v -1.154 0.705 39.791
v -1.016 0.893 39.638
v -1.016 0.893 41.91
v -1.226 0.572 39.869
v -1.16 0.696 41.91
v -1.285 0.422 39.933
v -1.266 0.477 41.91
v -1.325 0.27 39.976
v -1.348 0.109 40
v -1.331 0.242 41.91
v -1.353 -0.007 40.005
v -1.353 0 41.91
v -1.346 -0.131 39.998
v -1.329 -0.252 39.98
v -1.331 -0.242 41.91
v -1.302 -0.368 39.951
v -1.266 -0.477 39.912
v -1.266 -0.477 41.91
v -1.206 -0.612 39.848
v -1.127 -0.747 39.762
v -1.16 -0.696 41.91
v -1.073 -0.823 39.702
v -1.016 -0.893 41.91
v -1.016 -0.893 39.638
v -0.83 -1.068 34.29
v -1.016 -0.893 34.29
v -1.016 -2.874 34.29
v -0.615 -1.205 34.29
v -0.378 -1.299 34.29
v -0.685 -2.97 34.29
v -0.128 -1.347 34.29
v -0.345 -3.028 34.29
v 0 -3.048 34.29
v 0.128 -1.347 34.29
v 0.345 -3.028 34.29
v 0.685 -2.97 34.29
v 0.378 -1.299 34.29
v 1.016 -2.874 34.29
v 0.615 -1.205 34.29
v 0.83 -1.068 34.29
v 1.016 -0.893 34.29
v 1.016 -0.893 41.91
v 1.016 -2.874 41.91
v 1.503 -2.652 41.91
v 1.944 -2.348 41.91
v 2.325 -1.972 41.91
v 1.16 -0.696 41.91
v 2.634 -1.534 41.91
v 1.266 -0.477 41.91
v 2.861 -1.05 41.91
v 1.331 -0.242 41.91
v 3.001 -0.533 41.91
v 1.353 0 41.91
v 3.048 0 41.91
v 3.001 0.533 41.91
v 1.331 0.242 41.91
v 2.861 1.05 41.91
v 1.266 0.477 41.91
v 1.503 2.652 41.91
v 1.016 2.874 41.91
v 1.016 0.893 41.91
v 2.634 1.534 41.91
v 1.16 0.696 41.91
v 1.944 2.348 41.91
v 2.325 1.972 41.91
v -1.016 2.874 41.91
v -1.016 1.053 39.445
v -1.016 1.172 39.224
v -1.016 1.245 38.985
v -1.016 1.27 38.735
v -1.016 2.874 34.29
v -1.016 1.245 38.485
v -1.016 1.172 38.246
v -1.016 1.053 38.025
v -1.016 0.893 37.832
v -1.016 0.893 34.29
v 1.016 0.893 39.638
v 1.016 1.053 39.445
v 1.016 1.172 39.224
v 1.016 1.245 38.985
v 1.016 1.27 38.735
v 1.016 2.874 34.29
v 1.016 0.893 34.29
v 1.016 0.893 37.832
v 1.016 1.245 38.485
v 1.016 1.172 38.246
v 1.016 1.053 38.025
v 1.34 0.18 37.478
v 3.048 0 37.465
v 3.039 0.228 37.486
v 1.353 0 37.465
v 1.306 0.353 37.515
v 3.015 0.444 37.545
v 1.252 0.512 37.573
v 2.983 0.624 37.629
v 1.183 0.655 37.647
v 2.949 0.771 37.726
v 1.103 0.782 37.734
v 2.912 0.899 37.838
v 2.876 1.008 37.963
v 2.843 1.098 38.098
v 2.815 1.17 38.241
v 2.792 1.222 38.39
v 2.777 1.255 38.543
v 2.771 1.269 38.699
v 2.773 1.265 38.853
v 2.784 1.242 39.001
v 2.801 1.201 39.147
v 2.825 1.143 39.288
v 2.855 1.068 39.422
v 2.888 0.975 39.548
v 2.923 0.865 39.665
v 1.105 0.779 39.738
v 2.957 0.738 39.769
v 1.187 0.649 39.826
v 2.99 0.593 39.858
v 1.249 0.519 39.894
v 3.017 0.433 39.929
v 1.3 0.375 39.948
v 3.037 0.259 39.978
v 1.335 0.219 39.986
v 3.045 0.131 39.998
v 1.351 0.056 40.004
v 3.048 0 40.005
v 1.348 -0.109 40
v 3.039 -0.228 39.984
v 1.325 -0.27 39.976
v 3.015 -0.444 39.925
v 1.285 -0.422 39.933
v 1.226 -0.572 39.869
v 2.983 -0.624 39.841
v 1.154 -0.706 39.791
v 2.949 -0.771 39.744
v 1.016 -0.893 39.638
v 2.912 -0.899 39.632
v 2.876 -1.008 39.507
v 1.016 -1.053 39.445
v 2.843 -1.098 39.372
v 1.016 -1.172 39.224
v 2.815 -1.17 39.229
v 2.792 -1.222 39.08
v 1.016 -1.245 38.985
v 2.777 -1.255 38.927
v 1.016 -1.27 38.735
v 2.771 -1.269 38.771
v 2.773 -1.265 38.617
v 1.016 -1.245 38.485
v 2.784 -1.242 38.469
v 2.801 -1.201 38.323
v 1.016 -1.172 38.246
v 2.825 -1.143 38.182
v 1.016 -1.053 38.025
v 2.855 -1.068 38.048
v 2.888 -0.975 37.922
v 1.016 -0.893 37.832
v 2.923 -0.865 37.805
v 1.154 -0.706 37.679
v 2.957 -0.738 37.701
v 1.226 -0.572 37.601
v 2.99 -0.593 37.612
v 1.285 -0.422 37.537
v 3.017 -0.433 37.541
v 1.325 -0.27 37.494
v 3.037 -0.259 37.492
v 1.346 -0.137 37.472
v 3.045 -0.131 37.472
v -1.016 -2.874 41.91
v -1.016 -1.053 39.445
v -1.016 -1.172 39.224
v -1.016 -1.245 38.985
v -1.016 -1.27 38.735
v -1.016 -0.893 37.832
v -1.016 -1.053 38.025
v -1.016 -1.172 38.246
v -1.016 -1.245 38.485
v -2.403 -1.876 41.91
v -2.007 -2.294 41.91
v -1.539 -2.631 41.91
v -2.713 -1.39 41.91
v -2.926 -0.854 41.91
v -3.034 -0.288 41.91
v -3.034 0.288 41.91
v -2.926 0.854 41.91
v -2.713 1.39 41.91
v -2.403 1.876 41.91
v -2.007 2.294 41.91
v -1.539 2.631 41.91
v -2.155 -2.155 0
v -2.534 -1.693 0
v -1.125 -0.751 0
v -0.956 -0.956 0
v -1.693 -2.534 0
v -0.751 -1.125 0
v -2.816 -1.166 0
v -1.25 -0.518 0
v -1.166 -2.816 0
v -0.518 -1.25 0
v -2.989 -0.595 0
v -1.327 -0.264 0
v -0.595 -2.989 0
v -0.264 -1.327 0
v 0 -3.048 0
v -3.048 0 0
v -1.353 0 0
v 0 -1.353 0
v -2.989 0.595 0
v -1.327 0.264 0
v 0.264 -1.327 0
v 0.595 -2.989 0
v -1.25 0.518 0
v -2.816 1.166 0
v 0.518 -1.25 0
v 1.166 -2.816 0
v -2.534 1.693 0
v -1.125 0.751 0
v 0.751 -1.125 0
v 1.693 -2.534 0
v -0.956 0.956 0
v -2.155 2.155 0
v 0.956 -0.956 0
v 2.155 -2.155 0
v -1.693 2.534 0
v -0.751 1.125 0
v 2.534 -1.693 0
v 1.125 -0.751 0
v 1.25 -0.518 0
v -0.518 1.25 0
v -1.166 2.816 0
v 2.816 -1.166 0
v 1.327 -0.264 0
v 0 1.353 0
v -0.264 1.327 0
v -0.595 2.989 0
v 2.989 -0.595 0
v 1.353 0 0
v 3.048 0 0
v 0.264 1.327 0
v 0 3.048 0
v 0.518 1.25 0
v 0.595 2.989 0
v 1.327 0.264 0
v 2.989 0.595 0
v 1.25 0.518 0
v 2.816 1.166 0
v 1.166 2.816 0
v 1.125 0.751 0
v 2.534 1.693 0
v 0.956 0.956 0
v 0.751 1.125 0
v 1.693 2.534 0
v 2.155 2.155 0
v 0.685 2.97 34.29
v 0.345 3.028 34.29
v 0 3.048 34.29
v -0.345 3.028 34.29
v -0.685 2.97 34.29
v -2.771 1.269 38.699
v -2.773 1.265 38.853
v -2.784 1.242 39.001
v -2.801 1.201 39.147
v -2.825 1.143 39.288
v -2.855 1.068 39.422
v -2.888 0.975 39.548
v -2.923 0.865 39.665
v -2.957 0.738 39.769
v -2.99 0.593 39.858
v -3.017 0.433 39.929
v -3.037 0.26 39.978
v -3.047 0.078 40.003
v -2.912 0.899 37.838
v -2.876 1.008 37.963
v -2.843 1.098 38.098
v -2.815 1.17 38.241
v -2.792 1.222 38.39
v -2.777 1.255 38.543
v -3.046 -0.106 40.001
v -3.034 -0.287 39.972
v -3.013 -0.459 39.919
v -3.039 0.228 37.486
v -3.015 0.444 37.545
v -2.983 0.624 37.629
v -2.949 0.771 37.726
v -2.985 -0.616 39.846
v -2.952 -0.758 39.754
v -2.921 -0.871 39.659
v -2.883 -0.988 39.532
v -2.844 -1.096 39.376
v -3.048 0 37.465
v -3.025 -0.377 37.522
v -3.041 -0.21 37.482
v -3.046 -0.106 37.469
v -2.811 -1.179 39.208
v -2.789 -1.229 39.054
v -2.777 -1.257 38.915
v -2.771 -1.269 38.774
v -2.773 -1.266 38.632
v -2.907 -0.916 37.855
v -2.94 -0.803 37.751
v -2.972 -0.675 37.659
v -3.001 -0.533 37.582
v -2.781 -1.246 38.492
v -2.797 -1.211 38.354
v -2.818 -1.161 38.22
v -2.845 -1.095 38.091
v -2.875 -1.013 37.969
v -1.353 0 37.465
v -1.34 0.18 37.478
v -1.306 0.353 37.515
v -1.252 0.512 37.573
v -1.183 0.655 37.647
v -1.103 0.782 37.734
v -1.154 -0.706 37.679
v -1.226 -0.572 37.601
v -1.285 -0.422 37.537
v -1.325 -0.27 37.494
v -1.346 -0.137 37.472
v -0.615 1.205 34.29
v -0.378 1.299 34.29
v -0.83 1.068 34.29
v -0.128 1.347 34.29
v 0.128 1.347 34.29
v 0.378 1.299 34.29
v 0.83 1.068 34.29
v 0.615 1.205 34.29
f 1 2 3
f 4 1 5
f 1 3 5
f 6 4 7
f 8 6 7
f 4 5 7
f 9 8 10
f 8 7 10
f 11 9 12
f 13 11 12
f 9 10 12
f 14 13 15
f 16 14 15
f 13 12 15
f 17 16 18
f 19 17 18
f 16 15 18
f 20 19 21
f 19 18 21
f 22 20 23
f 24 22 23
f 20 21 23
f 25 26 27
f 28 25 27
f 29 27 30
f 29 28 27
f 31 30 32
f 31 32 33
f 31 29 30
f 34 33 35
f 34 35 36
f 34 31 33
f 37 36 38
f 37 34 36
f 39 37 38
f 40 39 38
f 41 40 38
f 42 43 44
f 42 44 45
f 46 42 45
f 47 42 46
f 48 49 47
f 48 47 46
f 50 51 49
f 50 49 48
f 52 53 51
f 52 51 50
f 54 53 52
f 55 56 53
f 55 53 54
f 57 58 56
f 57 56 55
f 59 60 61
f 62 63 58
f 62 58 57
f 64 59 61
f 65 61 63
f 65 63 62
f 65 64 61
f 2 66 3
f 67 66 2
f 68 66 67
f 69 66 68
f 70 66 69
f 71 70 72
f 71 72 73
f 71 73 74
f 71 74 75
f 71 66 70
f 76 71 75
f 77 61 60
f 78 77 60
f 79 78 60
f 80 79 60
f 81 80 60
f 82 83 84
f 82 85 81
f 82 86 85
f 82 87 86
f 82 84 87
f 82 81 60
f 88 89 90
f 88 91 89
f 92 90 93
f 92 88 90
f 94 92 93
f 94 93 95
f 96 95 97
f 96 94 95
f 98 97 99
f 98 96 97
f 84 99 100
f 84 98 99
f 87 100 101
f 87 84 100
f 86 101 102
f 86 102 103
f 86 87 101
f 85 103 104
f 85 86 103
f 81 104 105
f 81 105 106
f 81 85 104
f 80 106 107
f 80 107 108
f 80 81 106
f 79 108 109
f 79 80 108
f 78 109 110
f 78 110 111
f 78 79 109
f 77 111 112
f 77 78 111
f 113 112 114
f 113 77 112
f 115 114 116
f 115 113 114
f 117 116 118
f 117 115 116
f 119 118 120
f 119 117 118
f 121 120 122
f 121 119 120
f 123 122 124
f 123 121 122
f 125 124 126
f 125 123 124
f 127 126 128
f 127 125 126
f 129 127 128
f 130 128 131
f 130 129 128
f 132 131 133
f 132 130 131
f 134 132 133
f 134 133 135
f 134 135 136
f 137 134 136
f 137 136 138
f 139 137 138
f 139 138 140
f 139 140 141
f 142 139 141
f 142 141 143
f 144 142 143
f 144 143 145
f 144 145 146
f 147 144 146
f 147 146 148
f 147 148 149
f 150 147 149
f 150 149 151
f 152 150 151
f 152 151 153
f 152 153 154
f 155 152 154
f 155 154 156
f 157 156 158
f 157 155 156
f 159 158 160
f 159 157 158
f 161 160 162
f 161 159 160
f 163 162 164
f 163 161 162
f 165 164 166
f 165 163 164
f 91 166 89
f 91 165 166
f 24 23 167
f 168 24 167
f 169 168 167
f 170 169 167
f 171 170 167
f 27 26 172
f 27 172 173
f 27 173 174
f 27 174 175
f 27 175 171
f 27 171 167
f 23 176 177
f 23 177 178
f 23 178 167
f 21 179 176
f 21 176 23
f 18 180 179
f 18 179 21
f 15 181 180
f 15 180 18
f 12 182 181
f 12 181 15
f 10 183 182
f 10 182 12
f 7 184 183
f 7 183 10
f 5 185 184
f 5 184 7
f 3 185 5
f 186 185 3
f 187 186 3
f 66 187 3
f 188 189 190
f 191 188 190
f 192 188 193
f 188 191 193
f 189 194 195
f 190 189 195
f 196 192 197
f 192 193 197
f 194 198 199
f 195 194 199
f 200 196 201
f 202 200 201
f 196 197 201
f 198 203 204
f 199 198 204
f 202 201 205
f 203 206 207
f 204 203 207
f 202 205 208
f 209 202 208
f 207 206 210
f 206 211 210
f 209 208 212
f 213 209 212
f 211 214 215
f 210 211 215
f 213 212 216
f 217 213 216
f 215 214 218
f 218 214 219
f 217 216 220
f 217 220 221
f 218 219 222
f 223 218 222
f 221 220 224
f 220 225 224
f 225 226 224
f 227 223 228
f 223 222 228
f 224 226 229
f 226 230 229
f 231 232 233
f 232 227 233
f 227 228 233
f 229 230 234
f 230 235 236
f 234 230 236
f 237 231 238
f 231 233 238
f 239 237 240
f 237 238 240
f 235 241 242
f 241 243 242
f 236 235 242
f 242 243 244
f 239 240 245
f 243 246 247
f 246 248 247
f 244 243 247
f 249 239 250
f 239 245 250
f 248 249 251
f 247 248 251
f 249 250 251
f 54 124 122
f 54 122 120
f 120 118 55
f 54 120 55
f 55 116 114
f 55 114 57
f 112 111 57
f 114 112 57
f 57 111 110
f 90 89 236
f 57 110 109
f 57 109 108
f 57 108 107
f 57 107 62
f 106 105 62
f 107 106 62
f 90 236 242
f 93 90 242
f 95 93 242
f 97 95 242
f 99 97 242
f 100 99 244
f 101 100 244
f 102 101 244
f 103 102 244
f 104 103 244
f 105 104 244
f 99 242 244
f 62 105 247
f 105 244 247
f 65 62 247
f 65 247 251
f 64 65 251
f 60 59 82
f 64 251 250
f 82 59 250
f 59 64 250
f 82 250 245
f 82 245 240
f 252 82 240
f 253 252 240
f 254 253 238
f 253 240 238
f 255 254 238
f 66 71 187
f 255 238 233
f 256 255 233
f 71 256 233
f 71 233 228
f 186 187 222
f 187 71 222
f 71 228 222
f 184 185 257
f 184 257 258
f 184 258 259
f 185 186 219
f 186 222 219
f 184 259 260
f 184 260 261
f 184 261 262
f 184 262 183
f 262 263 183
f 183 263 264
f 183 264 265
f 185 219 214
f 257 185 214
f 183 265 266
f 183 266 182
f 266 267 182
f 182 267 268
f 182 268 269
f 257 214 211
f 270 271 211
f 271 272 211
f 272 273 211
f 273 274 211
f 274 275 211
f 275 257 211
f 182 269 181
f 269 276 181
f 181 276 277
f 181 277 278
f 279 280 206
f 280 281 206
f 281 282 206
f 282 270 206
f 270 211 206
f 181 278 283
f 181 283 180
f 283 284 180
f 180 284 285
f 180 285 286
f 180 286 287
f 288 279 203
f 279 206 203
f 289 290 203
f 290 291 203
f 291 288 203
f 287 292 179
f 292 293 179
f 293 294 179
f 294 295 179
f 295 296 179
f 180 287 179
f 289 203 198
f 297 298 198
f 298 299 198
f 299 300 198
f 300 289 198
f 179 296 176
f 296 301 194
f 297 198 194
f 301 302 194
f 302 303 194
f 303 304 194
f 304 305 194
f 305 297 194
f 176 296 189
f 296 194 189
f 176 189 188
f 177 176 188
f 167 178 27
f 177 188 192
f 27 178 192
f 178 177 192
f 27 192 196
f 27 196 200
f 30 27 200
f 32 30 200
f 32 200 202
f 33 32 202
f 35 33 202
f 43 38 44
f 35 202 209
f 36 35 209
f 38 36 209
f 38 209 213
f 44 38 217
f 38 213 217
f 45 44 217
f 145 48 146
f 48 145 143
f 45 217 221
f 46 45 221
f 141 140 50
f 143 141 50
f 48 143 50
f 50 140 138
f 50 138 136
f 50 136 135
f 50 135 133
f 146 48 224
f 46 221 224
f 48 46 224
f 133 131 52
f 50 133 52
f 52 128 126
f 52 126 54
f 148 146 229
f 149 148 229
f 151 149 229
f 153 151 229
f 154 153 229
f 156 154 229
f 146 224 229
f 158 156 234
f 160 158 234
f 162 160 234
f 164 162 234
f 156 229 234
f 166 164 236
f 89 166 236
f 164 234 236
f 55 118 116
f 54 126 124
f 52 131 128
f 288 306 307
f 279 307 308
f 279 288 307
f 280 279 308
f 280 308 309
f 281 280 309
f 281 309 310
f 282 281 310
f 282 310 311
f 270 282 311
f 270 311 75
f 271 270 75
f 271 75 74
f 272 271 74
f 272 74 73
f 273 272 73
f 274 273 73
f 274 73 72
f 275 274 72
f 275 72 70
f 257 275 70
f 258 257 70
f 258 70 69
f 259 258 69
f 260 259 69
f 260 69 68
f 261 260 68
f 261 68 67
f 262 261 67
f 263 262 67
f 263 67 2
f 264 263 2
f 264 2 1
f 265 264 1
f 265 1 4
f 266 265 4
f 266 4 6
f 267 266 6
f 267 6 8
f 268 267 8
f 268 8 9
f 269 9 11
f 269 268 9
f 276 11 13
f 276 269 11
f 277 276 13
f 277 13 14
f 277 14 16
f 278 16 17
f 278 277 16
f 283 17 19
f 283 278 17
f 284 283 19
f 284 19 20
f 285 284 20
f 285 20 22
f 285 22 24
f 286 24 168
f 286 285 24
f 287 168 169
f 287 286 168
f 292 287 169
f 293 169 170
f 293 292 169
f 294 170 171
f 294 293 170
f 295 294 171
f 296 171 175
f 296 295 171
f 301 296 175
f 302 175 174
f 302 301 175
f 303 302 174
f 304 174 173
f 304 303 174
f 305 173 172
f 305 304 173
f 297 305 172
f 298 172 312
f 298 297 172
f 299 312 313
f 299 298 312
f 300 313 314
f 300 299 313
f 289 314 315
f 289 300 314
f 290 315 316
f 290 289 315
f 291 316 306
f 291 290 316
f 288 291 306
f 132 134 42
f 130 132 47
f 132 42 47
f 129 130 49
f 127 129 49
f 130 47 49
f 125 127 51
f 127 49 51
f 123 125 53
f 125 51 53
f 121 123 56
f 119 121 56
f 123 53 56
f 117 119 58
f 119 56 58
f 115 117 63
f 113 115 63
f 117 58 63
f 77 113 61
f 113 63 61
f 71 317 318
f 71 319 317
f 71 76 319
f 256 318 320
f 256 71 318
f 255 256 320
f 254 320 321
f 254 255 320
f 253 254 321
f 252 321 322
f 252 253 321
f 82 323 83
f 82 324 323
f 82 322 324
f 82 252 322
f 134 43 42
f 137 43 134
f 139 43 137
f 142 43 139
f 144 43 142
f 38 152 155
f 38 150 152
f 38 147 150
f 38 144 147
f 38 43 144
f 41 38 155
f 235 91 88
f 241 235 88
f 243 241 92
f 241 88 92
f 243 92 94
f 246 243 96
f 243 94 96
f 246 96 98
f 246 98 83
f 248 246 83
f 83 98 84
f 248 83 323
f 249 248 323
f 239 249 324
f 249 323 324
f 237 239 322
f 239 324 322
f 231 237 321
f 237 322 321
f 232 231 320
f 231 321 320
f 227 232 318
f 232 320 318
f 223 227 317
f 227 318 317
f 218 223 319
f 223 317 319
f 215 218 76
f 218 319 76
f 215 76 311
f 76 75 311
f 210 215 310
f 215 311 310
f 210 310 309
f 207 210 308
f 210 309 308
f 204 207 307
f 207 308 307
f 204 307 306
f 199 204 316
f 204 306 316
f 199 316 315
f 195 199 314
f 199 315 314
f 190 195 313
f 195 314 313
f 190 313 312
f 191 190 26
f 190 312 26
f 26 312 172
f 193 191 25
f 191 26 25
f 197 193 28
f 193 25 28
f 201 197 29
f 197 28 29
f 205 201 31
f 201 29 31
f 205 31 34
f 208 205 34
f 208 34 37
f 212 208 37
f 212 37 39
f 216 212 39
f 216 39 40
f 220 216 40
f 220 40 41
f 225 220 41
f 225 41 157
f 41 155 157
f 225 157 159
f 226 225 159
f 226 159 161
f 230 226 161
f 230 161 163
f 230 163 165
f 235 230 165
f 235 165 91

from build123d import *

# Parameters (mm, degrees)
SKETCH1_R               = 3.048
BOSS_EXTRUDE1_DEPTH     = 41.91
CUT_EXTRUDE1_START      = -7.62
CUT_EXTRUDE1_DEPTH      = 7.62
CUT_EXTRUDE2_DEPTH      = 43.216756152
CUT_EXTRUDE2_DEPTH_BACK = 43.216756152
SKETCH3_R               = 1.27
F_6_32_TAPPED_HOLE1_D   = 2.7051


with BuildPart() as part:
    # Sketch1 → Boss-Extrude1 (new body)
    with BuildSketch(Plane.XY):
        Circle(SKETCH1_R)
    extrude(amount=BOSS_EXTRUDE1_DEPTH)

    # Sketch2 → Cut-Extrude1 (cut)
    with BuildSketch(Plane.XY.offset(41.91).offset(CUT_EXTRUDE1_START)):
        with BuildLine():
            ThreePointArc((1.016, 2.873681959), (0.515422831, 3.00410441), (0, 3.048))
            ThreePointArc((0, 3.048), (-0.515422831, 3.00410441), (-1.016, 2.873681959))
            Line((-1.016, 2.873681959), (-1.016, -2.873681959))
            ThreePointArc((-1.016, -2.873681959), (-0.515422831, -3.00410441), (0, -3.048))
            ThreePointArc((0, -3.048), (0.515422831, -3.00410441), (1.016, -2.873681959))
            Line((1.016, -2.873681959), (1.016, 2.873681959))
        make_face()
    extrude(amount=CUT_EXTRUDE1_DEPTH, mode=Mode.SUBTRACT)

    # Sketch3 → Cut-Extrude2 (cut, two sides: drawn at the far end of the back side and taken through both)
    with BuildSketch(Plane(origin=(-1.016, 0, 0), x_dir=(0, 0, -1), z_dir=(1, 0, 0)).offset(-CUT_EXTRUDE2_DEPTH_BACK)):
        with Locations((-38.735, 0)):
            Circle(SKETCH3_R)
    extrude(amount=CUT_EXTRUDE2_DEPTH + CUT_EXTRUDE2_DEPTH_BACK, mode=Mode.SUBTRACT)

    # #6-32 Tapped Hole1 (through all)
    with Locations(Plane(origin=(0, 0, 0), x_dir=(-1, 0, 0), z_dir=(0, 0, -1))):
        with Locations((0, 0), (6.460869533, -0.946768866)):
            Hole(F_6_32_TAPPED_HOLE1_D / 2)


solid = part.part
